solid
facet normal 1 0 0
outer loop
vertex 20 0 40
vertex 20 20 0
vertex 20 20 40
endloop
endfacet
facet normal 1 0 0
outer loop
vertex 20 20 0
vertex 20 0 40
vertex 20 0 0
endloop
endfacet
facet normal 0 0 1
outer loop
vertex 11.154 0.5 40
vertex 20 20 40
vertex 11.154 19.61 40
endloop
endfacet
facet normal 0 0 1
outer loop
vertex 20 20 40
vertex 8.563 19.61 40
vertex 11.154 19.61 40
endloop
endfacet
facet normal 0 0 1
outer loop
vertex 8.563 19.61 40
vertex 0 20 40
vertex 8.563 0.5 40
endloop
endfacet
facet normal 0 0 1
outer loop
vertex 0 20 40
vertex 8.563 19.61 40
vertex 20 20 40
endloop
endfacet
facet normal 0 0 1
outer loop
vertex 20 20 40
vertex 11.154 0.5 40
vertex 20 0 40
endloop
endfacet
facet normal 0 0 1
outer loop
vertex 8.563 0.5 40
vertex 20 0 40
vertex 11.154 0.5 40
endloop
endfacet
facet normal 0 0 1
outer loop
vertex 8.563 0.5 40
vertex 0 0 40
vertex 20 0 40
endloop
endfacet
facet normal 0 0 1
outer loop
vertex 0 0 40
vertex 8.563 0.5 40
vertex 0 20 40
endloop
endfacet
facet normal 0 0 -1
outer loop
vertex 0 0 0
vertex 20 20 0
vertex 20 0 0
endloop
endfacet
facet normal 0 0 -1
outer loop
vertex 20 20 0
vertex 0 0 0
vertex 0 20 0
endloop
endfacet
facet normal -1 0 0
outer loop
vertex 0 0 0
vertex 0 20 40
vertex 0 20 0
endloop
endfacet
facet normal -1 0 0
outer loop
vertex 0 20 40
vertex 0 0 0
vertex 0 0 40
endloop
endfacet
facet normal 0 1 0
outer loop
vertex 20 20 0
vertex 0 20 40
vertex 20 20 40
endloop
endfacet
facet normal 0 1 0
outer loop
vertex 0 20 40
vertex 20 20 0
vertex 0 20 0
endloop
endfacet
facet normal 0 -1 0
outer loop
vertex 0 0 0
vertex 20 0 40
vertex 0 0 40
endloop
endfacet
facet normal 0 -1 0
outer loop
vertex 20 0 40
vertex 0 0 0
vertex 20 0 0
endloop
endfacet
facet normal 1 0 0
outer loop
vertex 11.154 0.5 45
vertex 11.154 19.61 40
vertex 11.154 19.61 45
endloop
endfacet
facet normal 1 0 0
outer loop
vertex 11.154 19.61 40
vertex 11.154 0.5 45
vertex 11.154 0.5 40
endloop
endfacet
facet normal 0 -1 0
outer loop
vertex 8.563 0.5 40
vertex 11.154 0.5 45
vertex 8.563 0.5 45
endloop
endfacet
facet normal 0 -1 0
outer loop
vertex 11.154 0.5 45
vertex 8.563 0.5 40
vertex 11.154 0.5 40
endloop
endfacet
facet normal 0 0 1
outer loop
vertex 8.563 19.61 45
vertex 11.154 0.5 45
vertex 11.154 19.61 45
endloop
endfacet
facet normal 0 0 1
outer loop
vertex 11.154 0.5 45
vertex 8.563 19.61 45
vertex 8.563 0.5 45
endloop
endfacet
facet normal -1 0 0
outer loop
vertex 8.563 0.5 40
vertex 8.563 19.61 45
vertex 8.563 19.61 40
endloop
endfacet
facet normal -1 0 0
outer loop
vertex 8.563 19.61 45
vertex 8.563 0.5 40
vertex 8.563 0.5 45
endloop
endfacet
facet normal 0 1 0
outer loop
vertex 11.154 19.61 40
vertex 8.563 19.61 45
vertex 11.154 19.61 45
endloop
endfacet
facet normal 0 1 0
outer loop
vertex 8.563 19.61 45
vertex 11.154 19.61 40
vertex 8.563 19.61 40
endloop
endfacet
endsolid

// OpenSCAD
cube([20, 20, 40]);
translate([6, 0.5, 40]){
    linear_extrude(5){
        text("I", size=20);
    }
}
